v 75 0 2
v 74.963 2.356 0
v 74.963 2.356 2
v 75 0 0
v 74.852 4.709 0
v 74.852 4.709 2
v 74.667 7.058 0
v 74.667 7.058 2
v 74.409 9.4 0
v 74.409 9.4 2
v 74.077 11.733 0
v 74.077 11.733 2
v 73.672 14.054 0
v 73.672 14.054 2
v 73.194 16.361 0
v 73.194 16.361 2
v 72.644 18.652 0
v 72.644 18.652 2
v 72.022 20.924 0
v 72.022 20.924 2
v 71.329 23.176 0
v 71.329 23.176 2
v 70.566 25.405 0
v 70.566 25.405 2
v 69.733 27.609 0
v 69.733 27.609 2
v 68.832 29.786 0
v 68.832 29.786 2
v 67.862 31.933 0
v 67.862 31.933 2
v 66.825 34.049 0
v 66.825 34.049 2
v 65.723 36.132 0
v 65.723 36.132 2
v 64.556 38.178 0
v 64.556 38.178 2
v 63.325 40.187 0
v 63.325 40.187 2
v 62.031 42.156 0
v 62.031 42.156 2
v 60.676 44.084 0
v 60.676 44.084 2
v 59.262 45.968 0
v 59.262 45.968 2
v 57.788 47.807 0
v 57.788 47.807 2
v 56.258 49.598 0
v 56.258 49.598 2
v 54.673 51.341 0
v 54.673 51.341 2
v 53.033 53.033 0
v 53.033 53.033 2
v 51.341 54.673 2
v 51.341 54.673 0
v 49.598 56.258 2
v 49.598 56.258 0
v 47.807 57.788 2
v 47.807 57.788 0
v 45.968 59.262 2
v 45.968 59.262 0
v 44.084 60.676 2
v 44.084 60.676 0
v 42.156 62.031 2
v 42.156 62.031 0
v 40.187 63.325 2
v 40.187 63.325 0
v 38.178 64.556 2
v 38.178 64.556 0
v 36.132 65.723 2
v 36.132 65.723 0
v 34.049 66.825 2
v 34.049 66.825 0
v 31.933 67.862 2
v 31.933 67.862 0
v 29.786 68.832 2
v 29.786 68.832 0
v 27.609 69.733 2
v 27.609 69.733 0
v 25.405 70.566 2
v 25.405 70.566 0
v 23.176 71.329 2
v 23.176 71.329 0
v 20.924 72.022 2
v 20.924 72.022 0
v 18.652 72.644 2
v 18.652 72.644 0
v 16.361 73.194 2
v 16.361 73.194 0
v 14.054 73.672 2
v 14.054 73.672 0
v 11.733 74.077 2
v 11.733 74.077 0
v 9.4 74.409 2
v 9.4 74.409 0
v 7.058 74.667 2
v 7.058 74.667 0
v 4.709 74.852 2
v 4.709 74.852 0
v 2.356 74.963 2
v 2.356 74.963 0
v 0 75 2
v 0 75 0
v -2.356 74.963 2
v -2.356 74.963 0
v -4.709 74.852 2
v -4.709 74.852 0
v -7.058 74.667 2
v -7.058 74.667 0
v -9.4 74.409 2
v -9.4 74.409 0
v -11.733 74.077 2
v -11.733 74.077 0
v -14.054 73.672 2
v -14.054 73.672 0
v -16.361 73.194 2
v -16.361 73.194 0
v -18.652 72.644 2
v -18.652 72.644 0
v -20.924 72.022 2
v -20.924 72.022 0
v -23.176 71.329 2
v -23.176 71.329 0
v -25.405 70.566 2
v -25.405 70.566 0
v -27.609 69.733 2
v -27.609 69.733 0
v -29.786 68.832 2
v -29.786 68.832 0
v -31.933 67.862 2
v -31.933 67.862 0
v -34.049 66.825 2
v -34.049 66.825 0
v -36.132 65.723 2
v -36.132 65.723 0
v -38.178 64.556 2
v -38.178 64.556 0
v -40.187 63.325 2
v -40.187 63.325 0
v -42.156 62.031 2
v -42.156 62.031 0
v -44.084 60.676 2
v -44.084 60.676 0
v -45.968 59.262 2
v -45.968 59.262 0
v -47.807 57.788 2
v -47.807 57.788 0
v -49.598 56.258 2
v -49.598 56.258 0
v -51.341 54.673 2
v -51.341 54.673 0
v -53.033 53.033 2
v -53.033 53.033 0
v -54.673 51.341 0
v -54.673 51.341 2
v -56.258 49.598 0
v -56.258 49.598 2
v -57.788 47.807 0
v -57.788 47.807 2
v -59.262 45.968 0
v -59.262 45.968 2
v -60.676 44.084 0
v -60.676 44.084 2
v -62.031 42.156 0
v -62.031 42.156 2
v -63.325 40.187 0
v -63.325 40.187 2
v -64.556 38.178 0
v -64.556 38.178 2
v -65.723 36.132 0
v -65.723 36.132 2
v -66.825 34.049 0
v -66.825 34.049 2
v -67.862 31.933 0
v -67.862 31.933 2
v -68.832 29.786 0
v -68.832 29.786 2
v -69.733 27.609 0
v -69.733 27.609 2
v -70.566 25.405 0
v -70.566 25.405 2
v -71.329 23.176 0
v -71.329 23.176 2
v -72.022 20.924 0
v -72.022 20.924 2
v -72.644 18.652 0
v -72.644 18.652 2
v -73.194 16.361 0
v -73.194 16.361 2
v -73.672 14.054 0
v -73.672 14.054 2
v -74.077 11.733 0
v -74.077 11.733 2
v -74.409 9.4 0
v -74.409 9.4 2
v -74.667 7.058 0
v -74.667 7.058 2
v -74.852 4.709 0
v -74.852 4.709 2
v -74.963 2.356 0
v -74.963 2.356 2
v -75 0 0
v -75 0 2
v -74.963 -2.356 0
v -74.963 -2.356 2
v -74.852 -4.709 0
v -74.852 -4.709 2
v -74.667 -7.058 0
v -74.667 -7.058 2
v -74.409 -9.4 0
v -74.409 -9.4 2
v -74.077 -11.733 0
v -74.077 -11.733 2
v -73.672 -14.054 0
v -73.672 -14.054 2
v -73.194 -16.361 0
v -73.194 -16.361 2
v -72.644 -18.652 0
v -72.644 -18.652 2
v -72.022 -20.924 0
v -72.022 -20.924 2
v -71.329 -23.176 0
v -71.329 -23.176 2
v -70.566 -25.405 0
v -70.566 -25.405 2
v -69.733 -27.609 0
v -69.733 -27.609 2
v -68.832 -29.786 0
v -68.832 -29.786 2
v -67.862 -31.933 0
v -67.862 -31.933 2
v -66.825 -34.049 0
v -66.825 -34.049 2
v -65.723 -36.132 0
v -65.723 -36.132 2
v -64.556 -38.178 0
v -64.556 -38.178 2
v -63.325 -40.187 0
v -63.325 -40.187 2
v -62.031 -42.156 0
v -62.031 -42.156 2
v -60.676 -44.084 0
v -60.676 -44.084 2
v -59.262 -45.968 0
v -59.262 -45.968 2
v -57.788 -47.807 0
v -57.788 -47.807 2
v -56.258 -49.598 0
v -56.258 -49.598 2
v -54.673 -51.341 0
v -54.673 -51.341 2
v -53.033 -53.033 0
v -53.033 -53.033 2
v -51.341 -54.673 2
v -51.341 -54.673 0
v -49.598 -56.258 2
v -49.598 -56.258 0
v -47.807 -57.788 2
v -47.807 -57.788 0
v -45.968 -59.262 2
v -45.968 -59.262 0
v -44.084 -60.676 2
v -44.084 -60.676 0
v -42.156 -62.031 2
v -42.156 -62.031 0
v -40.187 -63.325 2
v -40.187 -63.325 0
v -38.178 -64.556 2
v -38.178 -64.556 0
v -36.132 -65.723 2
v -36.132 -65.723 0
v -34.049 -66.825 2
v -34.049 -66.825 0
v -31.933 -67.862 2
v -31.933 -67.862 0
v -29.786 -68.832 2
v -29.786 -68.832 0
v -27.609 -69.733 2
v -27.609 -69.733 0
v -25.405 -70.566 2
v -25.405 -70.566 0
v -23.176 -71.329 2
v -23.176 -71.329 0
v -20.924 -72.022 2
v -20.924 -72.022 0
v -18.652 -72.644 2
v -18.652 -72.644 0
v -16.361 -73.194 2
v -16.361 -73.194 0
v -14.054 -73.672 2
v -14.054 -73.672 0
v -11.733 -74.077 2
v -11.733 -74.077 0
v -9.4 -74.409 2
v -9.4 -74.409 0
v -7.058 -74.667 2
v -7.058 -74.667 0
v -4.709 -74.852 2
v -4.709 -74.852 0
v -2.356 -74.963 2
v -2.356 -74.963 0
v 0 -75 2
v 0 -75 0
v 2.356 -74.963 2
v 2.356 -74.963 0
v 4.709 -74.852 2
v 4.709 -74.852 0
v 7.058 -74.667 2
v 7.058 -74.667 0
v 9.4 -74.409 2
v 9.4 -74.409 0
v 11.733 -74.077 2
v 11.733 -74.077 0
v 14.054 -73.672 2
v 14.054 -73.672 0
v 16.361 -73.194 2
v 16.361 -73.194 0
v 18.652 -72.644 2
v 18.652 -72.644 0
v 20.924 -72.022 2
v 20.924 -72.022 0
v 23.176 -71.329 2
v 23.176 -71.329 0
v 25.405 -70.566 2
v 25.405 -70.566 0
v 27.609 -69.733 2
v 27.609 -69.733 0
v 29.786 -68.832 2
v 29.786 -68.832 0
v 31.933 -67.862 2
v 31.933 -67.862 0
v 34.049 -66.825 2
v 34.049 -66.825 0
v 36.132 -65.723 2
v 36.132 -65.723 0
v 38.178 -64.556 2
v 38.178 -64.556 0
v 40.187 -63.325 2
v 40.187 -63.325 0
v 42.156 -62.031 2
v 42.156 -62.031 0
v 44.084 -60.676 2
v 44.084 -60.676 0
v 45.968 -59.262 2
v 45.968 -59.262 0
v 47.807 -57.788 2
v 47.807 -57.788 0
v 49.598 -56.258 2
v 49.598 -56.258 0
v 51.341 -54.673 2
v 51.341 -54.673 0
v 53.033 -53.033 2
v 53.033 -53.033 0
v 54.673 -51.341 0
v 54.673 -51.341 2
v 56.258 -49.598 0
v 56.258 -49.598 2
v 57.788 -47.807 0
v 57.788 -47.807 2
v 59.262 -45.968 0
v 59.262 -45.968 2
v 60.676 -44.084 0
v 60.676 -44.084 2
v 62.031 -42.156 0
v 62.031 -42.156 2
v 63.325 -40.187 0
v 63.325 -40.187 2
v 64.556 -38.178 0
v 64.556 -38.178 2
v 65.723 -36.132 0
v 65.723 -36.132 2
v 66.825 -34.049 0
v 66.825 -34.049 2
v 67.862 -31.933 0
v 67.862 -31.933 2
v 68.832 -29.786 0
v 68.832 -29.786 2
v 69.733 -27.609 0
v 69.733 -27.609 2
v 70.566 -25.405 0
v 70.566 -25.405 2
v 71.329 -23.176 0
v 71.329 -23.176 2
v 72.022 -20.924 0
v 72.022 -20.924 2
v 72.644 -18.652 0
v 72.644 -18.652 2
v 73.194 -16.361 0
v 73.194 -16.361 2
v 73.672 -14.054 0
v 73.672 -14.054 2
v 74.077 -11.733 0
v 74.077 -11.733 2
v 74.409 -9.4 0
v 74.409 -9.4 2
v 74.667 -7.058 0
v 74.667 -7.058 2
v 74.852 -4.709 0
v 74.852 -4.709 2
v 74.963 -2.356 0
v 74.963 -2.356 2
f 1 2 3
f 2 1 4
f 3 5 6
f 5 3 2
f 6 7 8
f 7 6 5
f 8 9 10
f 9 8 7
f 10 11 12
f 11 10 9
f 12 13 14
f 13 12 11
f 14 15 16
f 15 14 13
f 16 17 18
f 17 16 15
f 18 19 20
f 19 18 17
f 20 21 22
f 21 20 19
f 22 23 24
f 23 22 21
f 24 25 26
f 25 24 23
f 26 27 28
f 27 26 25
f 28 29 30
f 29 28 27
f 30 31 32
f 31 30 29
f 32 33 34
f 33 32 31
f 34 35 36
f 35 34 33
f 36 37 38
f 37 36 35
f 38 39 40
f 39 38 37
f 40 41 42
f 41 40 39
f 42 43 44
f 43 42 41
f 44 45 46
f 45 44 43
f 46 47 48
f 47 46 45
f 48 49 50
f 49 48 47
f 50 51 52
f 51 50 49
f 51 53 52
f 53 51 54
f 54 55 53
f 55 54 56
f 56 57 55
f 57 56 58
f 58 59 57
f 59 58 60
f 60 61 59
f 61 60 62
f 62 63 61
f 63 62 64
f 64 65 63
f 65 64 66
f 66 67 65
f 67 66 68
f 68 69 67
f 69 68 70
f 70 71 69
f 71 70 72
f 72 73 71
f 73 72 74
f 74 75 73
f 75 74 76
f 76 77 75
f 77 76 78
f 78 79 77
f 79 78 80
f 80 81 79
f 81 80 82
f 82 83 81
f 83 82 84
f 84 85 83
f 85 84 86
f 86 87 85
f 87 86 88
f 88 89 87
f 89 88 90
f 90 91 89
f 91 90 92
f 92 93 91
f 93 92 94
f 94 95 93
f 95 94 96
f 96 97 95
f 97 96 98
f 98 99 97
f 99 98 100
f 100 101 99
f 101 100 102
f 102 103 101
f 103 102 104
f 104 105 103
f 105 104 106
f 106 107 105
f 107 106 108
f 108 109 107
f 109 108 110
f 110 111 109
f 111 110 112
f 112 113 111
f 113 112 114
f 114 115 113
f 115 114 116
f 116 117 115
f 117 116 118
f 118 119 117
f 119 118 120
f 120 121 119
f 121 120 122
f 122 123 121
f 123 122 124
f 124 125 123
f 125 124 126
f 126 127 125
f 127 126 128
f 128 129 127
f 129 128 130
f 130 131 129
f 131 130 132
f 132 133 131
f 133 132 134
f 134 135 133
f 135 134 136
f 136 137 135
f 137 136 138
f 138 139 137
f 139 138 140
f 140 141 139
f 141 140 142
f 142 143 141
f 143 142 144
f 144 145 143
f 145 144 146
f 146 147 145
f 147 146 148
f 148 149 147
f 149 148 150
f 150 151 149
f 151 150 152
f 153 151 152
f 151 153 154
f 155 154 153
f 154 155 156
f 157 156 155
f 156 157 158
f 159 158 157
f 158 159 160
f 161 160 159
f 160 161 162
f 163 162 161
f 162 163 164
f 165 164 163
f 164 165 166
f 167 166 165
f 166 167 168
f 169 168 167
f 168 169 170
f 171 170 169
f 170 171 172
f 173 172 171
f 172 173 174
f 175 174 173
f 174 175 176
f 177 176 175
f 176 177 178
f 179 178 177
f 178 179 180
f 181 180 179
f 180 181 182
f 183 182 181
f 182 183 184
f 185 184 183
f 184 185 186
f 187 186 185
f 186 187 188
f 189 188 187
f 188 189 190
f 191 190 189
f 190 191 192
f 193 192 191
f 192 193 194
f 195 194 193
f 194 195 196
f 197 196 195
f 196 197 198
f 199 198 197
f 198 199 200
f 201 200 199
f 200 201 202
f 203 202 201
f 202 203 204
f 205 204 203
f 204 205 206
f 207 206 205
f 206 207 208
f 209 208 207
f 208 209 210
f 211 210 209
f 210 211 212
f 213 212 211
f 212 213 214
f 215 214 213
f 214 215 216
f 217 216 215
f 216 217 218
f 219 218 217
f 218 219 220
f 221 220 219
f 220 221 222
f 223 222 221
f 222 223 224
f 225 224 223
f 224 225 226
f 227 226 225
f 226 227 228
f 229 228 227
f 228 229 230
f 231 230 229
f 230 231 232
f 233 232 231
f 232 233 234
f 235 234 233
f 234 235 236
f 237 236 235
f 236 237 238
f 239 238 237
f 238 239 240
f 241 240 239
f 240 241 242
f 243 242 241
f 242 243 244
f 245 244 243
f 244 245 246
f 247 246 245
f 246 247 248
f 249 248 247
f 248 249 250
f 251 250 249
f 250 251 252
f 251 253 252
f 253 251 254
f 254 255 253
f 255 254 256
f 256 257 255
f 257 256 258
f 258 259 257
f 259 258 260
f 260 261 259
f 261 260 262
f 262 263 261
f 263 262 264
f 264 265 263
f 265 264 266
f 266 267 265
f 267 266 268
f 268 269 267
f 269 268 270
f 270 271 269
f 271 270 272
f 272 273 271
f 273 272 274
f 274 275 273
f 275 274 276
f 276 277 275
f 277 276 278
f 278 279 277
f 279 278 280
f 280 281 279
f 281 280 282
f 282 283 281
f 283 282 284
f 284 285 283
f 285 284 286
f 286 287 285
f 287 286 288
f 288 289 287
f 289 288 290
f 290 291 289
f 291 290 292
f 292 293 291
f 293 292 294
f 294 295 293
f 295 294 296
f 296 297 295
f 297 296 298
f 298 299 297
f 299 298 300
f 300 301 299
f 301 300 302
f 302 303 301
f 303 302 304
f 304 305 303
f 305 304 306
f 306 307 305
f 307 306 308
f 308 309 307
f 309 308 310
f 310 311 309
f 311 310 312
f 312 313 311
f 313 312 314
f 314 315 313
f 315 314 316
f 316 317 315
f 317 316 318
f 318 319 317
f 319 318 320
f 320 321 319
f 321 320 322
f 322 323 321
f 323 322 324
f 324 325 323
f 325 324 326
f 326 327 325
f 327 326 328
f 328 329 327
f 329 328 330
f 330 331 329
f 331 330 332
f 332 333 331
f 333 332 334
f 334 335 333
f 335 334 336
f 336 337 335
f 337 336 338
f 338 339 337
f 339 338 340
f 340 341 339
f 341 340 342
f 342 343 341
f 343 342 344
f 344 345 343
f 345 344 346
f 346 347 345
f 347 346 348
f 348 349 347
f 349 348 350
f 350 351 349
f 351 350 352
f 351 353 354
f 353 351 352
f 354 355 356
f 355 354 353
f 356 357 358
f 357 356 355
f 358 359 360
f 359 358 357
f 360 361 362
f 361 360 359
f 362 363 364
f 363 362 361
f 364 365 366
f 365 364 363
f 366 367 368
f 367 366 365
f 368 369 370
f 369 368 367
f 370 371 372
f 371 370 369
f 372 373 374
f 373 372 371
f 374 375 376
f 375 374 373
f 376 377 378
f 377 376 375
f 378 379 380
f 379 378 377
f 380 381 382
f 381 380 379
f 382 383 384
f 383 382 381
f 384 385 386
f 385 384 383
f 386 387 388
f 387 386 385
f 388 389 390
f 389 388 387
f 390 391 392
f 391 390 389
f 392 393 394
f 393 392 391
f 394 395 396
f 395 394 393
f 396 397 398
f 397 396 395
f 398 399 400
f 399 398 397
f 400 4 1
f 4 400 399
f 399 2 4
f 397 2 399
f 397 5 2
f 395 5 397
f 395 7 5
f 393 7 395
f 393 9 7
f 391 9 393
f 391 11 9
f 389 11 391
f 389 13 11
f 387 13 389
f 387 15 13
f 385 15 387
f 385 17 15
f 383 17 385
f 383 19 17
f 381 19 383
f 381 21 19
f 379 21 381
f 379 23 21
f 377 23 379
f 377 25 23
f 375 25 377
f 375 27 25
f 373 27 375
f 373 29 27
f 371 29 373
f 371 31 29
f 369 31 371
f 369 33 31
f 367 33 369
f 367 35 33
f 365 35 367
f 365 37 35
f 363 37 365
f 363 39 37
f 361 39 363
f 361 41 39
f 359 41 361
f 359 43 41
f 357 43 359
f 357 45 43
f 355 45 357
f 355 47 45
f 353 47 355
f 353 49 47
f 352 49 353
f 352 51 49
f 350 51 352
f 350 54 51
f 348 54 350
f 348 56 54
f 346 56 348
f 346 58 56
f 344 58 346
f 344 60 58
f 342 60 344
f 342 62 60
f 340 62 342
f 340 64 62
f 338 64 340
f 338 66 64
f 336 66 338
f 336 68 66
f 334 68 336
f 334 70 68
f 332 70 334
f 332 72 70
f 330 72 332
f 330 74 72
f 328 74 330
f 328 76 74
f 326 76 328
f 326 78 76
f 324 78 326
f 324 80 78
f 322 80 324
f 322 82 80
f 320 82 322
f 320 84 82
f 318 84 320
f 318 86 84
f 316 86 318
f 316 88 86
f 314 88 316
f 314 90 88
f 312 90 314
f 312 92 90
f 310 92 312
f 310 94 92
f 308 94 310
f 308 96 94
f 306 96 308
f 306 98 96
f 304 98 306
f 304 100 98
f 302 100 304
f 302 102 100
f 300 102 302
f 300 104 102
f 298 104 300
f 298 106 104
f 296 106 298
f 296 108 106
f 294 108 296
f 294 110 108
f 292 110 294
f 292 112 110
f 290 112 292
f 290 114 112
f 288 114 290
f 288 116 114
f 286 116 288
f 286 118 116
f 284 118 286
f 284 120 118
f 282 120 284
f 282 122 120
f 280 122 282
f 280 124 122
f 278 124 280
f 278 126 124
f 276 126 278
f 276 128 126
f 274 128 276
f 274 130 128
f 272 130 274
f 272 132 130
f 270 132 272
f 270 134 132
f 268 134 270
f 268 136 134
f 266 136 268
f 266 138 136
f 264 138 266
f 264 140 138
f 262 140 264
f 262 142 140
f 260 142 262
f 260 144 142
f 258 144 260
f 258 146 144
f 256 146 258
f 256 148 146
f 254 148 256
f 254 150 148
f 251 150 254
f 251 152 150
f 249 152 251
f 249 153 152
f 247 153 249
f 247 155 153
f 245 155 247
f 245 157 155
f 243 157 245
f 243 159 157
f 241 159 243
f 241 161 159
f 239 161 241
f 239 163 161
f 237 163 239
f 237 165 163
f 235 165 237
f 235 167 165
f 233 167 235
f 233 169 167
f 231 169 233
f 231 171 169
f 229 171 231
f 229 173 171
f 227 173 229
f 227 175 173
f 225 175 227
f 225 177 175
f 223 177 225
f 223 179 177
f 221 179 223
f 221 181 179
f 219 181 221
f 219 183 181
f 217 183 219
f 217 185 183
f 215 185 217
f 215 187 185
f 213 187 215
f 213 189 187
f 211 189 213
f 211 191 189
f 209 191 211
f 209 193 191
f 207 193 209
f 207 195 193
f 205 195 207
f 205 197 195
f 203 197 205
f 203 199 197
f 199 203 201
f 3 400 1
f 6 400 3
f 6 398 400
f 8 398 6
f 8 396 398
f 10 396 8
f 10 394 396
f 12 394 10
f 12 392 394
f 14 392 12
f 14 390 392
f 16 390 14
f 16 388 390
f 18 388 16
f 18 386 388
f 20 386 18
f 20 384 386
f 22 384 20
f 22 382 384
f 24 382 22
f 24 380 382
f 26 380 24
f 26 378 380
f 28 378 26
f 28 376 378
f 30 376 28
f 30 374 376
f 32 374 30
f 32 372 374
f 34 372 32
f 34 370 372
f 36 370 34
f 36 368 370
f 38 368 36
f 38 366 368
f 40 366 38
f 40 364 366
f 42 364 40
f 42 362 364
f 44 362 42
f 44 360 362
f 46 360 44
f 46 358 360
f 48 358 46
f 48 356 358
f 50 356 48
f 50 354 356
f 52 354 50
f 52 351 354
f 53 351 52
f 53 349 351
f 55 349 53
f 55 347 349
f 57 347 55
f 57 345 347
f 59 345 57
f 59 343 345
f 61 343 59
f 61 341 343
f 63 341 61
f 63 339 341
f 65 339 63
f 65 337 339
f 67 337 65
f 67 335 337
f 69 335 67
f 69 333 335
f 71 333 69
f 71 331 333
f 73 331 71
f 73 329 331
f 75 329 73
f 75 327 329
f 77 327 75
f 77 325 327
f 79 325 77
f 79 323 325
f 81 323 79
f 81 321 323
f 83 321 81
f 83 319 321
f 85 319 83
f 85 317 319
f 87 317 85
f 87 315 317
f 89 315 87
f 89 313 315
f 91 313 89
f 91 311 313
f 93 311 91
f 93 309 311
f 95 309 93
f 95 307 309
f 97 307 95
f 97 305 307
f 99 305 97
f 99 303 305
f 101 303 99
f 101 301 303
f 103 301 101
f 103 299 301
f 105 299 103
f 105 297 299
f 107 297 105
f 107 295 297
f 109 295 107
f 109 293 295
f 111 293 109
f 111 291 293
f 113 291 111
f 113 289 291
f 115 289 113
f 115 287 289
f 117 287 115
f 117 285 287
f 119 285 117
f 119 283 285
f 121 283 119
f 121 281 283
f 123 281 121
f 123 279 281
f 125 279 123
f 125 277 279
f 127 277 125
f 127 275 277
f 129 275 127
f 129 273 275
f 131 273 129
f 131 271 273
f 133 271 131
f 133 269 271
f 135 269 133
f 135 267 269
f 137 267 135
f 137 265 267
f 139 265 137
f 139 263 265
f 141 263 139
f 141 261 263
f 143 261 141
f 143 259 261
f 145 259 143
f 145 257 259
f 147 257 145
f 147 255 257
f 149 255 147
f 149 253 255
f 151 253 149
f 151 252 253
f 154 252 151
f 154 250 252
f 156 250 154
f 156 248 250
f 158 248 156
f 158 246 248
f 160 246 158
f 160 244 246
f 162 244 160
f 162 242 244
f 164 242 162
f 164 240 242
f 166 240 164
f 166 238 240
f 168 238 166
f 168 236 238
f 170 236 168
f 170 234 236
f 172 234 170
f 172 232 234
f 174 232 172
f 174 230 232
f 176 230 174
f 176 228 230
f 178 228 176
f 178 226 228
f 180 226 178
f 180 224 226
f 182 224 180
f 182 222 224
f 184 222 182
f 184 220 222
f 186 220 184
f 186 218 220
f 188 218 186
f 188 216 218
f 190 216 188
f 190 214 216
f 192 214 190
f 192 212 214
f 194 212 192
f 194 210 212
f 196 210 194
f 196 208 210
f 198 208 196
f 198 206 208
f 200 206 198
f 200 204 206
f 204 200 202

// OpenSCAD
$fn=200;

h=2;
a=130; // diameter
s=10; // seam allowance

cylinder(h=2, d=a+s+s);
